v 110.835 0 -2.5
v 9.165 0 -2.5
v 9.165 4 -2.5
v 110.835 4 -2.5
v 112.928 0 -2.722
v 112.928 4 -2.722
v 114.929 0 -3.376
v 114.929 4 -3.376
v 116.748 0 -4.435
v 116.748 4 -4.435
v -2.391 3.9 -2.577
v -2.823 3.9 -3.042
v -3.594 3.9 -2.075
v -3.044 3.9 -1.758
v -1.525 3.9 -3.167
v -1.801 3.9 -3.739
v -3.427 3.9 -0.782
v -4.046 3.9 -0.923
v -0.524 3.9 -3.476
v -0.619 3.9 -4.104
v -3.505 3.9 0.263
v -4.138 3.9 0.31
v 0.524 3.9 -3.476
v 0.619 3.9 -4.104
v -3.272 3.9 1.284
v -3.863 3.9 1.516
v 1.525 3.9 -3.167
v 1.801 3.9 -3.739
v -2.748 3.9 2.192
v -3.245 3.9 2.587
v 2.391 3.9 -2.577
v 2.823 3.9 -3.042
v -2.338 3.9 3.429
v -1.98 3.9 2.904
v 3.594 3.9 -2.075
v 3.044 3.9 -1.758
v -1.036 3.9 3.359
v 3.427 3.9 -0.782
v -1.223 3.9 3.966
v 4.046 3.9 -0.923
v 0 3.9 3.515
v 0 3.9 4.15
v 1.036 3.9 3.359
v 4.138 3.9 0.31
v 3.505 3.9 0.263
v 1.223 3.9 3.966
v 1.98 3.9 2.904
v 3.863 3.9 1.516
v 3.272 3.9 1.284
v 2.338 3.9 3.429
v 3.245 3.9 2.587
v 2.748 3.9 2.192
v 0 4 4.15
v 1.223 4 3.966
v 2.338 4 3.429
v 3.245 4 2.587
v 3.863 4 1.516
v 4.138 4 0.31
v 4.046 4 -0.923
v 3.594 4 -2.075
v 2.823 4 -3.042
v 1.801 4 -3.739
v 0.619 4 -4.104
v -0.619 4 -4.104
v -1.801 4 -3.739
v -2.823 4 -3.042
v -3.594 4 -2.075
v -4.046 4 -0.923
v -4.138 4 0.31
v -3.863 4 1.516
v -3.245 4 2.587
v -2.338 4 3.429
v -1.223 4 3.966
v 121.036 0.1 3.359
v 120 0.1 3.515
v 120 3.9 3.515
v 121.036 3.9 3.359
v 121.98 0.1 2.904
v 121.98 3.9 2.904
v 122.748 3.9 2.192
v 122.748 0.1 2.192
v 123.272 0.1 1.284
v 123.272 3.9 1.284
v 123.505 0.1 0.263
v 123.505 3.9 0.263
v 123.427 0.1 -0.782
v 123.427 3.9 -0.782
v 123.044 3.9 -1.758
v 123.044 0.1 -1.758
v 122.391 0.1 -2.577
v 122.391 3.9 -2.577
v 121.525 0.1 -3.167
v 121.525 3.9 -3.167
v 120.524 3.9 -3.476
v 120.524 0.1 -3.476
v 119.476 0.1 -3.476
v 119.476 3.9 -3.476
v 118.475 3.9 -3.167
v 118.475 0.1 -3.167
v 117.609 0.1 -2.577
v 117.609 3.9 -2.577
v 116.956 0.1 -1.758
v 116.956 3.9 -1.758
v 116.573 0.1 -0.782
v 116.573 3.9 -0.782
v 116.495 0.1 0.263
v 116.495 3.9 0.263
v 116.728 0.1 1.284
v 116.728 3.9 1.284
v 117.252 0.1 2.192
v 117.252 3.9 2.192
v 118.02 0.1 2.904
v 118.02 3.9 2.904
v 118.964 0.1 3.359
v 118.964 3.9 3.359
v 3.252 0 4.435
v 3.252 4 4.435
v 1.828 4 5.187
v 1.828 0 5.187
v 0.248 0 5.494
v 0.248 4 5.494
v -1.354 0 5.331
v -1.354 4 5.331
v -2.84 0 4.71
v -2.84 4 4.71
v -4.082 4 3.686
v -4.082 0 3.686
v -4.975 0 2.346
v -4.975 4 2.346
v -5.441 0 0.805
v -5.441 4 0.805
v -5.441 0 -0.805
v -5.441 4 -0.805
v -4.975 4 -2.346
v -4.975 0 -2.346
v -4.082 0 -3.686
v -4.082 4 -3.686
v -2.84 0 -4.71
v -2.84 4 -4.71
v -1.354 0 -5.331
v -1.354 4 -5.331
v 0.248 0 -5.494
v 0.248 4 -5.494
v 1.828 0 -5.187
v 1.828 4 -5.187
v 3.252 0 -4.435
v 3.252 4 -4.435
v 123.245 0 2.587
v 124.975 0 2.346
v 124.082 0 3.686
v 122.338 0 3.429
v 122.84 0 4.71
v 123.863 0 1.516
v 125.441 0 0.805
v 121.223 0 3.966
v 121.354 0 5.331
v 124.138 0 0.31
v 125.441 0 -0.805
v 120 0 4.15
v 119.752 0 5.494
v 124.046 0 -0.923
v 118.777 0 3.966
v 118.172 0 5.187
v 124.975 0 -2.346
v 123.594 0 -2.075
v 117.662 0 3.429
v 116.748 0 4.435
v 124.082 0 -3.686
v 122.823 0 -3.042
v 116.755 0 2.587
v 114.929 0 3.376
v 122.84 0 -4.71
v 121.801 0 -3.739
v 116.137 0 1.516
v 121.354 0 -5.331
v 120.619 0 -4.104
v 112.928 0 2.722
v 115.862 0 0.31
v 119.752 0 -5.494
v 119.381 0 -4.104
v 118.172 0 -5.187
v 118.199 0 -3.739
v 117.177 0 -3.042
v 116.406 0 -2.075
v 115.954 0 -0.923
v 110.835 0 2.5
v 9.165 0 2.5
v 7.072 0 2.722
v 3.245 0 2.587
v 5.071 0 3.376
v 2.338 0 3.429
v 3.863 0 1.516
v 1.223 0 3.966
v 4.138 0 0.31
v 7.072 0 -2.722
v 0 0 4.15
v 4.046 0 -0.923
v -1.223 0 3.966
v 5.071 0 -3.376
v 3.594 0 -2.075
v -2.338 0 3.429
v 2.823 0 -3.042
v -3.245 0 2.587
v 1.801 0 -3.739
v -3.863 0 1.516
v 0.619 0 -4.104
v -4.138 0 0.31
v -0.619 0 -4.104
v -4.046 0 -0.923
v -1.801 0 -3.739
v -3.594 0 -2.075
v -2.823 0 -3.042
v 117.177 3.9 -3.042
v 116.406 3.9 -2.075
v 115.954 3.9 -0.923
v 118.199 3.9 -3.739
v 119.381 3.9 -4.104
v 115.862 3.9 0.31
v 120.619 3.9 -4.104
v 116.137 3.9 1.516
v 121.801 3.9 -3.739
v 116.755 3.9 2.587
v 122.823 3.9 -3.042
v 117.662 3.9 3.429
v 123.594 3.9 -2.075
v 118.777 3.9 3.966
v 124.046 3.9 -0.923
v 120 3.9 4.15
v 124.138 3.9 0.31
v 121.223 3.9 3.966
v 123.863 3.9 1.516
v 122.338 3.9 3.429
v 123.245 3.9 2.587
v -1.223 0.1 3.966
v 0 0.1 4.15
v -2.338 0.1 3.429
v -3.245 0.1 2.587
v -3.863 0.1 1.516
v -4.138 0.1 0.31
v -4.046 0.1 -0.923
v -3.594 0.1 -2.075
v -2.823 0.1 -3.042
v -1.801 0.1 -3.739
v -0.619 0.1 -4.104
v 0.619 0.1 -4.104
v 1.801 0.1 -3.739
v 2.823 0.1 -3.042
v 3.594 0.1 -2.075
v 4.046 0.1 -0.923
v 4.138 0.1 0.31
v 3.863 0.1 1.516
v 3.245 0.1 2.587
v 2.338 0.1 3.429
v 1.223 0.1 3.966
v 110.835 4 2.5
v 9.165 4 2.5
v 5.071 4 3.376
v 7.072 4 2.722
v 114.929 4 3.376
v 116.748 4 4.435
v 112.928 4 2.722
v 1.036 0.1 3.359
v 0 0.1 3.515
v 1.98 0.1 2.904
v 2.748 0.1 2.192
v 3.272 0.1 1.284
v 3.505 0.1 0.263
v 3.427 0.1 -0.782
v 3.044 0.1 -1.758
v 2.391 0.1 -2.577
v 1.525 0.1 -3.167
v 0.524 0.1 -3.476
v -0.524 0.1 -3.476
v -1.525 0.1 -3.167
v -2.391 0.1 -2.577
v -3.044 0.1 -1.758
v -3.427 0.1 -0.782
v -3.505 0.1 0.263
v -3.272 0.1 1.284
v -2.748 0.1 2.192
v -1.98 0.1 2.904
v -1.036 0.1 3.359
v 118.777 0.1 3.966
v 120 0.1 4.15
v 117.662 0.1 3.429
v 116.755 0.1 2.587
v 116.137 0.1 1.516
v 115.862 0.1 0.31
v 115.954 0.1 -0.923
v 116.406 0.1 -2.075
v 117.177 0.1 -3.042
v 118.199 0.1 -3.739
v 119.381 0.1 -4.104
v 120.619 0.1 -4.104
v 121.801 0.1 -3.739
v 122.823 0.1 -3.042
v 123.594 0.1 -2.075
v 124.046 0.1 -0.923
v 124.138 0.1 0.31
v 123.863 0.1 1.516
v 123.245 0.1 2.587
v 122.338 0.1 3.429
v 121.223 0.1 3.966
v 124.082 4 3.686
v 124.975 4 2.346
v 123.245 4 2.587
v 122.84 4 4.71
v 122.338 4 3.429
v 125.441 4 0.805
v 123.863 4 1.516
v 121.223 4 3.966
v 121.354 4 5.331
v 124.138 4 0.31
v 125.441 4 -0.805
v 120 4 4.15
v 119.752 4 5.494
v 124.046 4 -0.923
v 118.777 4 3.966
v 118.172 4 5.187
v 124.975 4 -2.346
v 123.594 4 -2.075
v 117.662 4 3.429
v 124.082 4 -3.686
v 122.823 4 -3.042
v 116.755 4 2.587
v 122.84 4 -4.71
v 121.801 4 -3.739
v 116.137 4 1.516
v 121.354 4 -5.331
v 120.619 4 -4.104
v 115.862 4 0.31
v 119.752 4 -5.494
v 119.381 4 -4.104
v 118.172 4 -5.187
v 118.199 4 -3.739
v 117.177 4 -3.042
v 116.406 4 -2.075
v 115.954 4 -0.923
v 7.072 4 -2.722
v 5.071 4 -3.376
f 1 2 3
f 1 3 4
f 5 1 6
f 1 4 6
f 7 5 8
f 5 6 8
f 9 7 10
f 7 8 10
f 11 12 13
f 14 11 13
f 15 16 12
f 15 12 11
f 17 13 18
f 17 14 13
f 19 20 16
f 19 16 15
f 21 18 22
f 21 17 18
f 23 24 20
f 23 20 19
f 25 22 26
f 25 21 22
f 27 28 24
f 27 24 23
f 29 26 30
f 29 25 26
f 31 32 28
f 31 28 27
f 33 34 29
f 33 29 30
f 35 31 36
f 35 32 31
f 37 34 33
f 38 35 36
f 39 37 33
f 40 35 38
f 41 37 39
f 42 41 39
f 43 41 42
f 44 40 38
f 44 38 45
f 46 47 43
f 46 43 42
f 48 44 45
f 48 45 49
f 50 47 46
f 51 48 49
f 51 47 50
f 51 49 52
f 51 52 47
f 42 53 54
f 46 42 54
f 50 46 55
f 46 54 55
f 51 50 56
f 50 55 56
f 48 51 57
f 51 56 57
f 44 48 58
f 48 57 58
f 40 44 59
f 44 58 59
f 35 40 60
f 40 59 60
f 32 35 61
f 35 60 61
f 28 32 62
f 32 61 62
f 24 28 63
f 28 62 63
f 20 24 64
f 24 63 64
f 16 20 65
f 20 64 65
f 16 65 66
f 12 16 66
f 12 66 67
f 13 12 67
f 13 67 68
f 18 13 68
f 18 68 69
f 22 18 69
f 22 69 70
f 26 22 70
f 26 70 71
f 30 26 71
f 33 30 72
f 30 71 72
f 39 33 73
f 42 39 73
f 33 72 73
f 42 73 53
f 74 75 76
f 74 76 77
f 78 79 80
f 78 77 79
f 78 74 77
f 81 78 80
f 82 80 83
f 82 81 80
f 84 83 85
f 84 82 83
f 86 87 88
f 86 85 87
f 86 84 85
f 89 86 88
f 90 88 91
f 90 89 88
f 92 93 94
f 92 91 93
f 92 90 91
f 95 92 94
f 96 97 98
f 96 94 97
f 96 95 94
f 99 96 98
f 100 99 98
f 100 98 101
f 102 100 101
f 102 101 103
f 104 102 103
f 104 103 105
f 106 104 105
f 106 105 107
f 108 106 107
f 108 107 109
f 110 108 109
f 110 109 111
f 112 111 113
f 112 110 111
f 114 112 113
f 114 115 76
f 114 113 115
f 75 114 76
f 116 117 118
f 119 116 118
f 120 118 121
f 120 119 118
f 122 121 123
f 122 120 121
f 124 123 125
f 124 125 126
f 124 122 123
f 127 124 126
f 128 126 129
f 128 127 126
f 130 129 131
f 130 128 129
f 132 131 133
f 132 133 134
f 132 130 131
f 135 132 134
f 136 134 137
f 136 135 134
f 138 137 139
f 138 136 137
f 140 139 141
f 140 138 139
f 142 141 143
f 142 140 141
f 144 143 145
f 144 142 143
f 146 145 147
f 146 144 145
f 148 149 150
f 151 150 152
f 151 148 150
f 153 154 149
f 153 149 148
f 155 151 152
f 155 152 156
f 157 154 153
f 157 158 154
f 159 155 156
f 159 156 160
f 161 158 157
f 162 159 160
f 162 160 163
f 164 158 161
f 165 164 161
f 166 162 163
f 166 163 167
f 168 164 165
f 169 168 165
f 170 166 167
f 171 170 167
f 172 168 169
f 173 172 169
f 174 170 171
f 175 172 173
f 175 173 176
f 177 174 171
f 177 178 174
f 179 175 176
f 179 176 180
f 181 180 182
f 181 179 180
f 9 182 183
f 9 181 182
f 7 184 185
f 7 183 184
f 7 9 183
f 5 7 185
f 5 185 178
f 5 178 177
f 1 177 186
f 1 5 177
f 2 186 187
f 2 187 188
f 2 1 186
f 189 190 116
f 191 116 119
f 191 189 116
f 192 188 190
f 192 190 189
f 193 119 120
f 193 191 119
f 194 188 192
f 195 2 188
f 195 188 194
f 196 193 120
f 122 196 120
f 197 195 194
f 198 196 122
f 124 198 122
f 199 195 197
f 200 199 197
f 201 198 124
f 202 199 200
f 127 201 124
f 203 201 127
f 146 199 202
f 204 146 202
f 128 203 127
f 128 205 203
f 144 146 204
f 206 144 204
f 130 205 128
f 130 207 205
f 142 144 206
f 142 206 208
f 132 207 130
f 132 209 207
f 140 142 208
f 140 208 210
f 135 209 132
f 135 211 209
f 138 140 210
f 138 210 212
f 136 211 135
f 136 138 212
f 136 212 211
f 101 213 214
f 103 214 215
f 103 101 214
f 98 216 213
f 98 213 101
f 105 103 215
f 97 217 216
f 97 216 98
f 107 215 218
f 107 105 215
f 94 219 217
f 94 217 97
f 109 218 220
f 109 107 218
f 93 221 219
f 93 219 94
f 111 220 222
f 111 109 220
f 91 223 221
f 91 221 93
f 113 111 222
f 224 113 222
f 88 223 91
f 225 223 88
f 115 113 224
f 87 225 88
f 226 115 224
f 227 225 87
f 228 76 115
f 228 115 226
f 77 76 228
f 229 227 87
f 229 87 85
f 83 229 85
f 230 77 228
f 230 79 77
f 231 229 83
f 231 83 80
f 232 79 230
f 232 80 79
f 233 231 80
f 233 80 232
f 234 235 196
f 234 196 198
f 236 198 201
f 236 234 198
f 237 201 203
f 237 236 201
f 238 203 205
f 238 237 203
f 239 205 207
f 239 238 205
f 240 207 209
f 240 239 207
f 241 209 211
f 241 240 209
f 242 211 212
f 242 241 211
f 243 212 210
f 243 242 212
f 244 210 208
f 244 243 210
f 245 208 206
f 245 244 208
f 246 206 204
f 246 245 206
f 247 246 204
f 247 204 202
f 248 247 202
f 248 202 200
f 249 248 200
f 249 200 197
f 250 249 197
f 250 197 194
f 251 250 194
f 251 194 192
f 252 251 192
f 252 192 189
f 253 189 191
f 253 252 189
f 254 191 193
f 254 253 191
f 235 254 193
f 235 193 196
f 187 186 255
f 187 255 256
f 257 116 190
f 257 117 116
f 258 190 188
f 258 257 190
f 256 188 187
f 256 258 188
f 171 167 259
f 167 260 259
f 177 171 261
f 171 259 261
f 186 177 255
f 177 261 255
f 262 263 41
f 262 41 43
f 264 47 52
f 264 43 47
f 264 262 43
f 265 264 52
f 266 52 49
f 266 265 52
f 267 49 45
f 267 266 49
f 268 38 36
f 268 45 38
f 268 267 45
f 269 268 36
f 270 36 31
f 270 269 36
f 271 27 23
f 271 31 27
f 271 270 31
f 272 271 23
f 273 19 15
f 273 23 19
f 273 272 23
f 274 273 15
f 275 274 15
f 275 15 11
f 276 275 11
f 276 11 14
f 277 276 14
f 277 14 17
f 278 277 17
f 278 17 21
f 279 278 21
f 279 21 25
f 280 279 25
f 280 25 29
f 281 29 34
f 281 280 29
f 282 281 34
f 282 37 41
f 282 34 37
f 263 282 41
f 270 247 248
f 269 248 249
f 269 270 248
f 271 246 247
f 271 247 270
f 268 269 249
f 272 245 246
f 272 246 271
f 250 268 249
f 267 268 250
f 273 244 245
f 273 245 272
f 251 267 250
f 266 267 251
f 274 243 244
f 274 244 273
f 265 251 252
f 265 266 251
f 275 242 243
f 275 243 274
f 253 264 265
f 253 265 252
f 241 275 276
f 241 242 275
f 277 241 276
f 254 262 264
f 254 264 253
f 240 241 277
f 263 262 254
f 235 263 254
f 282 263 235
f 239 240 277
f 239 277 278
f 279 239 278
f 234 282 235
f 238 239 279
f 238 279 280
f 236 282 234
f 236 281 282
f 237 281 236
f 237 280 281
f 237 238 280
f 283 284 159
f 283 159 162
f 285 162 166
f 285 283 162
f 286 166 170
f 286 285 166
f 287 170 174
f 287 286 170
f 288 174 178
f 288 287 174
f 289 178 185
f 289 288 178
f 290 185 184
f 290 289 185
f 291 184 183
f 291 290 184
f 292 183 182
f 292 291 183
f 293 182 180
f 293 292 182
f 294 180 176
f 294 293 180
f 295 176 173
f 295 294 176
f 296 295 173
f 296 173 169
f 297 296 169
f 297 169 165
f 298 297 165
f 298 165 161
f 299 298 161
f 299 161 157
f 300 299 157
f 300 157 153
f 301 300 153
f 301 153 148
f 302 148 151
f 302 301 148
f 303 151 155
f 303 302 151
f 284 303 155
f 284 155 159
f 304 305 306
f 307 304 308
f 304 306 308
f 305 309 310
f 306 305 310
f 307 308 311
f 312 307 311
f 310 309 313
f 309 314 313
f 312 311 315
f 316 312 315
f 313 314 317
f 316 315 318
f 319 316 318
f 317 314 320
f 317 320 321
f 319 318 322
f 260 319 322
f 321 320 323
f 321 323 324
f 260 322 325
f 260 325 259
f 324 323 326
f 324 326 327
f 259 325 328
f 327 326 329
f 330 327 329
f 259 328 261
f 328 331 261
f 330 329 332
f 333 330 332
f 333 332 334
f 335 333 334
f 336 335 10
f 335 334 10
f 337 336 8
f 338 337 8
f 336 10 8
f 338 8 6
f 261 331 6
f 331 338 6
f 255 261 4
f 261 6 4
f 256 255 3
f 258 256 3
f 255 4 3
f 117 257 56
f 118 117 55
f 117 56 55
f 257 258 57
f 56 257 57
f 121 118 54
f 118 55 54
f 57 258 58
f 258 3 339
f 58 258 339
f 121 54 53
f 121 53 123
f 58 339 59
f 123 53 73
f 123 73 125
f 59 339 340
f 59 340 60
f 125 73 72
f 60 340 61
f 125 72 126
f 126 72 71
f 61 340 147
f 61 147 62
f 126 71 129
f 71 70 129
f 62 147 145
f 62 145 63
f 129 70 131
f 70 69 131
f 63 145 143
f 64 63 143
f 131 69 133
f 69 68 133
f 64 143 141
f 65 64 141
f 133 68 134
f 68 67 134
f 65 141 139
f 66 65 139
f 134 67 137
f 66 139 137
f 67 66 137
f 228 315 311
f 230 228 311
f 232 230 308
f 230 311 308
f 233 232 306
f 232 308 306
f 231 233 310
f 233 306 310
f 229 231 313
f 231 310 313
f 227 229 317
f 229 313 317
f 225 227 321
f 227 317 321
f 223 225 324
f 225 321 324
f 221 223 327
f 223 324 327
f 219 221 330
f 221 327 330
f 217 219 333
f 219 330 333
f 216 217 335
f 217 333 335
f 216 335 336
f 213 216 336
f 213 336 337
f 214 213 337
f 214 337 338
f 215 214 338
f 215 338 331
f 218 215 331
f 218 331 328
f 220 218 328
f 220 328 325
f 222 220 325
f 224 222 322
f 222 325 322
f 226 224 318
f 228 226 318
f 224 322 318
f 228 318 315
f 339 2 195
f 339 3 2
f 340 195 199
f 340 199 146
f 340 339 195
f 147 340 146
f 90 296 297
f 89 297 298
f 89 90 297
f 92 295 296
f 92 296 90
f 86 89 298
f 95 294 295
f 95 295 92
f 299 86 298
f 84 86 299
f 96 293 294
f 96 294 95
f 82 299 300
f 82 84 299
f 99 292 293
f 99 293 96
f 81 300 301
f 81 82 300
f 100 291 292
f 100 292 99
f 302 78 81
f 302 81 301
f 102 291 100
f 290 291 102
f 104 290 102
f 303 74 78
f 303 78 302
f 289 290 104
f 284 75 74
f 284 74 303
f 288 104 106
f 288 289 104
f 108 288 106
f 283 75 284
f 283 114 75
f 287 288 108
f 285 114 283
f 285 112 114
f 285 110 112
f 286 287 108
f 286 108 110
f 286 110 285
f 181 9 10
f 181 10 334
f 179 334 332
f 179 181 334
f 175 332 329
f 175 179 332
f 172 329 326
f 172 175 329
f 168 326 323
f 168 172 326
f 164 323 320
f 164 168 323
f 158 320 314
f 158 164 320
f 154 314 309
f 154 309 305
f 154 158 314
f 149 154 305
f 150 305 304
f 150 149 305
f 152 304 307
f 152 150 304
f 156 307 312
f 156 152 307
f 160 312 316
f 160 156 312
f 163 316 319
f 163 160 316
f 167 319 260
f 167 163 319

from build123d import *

# Parameters (mm, degrees)
SKETCH_1_R          = 3.515
EXTRUDE_1_DEPTH     = 4
FILLET_1_R          = 10
SKETCH_3_R          = 4.15
CUT_EXTRUDE_2_DEPTH = 0.1
CUT_EXTRUDE_START   = -0.1
SKETCH_4_R          = 4.15
CUT_EXTRUDE_3_DEPTH = 0.1


with BuildPart() as part:
    # 草图1 → 凸台-拉伸1 (new body)
    with BuildSketch(Plane(origin=(0, 0, 0), x_dir=(1, 0, 0), z_dir=(0, 1, 0))):
        with BuildLine():
            Line((4.898979486, 2.5), (115.101020514, 2.5))
            ThreePointArc((115.101020514, 2.5), (125.5, 0), (115.101020514, -2.5))
            Line((115.101020514, -2.5), (4.898979486, -2.5))
            ThreePointArc((4.898979486, -2.5), (-5.5, 0), (4.898979486, 2.5))
        make_face()
        with Locations(Location((0, 0, 0), (0, 0, 270))):
            Circle(SKETCH_1_R, mode=Mode.SUBTRACT)
        with Locations(Location((120, 0, 0), (0, 0, 270))):
            Circle(SKETCH_1_R, mode=Mode.SUBTRACT)
    extrude(amount=EXTRUDE_1_DEPTH)

    # 圆角1
    fillet_1_edges = [part.edges().sort_by_distance(p)[0] for p in [
        (4.898979486, 2, -2.5),
        (115.101020514, 2, -2.5),
        (115.101020514, 2, 2.5),
        (4.898979486, 2, 2.5),
    ]]
    fillet(fillet_1_edges, radius=FILLET_1_R)

    # 草图3 → 切除-拉伸2 (cut)
    with BuildSketch(Plane(origin=(0, 4, 0), x_dir=(1, 0, 0), z_dir=(0, 1, 0))):
        with Locations(Location((0, 0, 0), (0, 0, 270))):
            Circle(SKETCH_3_R)
        with Locations(Location((120, 0, 0), (0, 0, 270))):
            Circle(SKETCH_3_R)
    extrude(amount=-CUT_EXTRUDE_2_DEPTH, mode=Mode.SUBTRACT)

    # 草图4 → 切除-拉伸3 (cut)
    with BuildSketch(Plane.XZ.offset(CUT_EXTRUDE_START)):
        with Locations(Location((0, 0, 0), (0, 0, 90))):
            Circle(SKETCH_4_R)
        with Locations(Location((120, 0, 0), (0, 0, 90))):
            Circle(SKETCH_4_R)
    extrude(amount=CUT_EXTRUDE_3_DEPTH, mode=Mode.SUBTRACT)


solid = part.part
